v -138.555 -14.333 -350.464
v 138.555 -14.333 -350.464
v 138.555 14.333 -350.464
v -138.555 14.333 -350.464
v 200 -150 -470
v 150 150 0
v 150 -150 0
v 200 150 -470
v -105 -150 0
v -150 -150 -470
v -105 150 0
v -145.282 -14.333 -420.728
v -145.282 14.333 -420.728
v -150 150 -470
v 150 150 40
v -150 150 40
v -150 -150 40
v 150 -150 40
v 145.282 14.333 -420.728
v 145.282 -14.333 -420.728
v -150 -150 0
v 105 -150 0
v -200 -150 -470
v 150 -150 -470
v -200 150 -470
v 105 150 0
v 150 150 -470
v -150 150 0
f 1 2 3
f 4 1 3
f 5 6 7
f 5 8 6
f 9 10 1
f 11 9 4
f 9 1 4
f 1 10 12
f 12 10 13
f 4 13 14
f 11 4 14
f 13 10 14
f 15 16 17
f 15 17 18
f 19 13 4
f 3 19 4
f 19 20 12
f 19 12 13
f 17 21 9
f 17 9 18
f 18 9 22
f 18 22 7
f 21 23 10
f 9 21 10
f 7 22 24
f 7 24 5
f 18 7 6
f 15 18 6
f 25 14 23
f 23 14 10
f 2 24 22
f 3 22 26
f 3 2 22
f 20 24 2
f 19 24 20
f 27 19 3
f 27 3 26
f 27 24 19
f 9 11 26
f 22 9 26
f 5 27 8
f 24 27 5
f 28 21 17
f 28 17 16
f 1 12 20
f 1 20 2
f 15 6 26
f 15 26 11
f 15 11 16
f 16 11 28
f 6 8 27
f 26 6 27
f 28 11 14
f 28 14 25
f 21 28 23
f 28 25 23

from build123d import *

# Parameters (mm, degrees)
F0_W          = 300
F0_H          = 300
F1_DEPTH      = 40
F4_W          = 45
F4_H          = 300
F3_W          = 50
F3_H          = 300
F7_W          = 28.6667700857
F7_H          = 70.264339447
F8_DEPTH      = 150
F8_DEPTH_BACK = 150


# Not quite as in the source:
# - an extrude ends at something that could not be found from the text; its depth is read off the source's solid


with BuildPart() as f1:
    # F0 (on Top) → F1 (new body)
    with BuildSketch(Plane.XY):
        Rectangle(F0_W, F0_H)
    extrude(amount=F1_DEPTH)

    # F4 (on face) → F5 section 0
    with BuildSketch(Plane(origin=(0, 0, 0), x_dir=(1, 0, 0), z_dir=(0, 0, -1))):
        with Locations((127.5, 0)):
            Rectangle(F4_W, F4_H)
    # F3 (on offset) → F5 section 1
    with BuildSketch(Plane(origin=(0, 0, -470), x_dir=(1, 0, 0), z_dir=(0, 0, -1))):
        with Locations((175, 0)):
            Rectangle(F3_W, F3_H)
    loft()

    # F6: F1 across plane


with BuildPart() as f1_1:
    add(f1.part)
    add(f1.part.mirror(Plane.YZ))

    # F7 (on Right) → F8 (join, two sides)
    with BuildSketch(Plane.YZ) as f8_sk:
        with Locations((0, -385.5957090855)):
            Rectangle(F7_W, F7_H)
    extrude(amount=F8_DEPTH)
    extrude(f8_sk.sketch, amount=-F8_DEPTH_BACK)


solid = f1_1.part
